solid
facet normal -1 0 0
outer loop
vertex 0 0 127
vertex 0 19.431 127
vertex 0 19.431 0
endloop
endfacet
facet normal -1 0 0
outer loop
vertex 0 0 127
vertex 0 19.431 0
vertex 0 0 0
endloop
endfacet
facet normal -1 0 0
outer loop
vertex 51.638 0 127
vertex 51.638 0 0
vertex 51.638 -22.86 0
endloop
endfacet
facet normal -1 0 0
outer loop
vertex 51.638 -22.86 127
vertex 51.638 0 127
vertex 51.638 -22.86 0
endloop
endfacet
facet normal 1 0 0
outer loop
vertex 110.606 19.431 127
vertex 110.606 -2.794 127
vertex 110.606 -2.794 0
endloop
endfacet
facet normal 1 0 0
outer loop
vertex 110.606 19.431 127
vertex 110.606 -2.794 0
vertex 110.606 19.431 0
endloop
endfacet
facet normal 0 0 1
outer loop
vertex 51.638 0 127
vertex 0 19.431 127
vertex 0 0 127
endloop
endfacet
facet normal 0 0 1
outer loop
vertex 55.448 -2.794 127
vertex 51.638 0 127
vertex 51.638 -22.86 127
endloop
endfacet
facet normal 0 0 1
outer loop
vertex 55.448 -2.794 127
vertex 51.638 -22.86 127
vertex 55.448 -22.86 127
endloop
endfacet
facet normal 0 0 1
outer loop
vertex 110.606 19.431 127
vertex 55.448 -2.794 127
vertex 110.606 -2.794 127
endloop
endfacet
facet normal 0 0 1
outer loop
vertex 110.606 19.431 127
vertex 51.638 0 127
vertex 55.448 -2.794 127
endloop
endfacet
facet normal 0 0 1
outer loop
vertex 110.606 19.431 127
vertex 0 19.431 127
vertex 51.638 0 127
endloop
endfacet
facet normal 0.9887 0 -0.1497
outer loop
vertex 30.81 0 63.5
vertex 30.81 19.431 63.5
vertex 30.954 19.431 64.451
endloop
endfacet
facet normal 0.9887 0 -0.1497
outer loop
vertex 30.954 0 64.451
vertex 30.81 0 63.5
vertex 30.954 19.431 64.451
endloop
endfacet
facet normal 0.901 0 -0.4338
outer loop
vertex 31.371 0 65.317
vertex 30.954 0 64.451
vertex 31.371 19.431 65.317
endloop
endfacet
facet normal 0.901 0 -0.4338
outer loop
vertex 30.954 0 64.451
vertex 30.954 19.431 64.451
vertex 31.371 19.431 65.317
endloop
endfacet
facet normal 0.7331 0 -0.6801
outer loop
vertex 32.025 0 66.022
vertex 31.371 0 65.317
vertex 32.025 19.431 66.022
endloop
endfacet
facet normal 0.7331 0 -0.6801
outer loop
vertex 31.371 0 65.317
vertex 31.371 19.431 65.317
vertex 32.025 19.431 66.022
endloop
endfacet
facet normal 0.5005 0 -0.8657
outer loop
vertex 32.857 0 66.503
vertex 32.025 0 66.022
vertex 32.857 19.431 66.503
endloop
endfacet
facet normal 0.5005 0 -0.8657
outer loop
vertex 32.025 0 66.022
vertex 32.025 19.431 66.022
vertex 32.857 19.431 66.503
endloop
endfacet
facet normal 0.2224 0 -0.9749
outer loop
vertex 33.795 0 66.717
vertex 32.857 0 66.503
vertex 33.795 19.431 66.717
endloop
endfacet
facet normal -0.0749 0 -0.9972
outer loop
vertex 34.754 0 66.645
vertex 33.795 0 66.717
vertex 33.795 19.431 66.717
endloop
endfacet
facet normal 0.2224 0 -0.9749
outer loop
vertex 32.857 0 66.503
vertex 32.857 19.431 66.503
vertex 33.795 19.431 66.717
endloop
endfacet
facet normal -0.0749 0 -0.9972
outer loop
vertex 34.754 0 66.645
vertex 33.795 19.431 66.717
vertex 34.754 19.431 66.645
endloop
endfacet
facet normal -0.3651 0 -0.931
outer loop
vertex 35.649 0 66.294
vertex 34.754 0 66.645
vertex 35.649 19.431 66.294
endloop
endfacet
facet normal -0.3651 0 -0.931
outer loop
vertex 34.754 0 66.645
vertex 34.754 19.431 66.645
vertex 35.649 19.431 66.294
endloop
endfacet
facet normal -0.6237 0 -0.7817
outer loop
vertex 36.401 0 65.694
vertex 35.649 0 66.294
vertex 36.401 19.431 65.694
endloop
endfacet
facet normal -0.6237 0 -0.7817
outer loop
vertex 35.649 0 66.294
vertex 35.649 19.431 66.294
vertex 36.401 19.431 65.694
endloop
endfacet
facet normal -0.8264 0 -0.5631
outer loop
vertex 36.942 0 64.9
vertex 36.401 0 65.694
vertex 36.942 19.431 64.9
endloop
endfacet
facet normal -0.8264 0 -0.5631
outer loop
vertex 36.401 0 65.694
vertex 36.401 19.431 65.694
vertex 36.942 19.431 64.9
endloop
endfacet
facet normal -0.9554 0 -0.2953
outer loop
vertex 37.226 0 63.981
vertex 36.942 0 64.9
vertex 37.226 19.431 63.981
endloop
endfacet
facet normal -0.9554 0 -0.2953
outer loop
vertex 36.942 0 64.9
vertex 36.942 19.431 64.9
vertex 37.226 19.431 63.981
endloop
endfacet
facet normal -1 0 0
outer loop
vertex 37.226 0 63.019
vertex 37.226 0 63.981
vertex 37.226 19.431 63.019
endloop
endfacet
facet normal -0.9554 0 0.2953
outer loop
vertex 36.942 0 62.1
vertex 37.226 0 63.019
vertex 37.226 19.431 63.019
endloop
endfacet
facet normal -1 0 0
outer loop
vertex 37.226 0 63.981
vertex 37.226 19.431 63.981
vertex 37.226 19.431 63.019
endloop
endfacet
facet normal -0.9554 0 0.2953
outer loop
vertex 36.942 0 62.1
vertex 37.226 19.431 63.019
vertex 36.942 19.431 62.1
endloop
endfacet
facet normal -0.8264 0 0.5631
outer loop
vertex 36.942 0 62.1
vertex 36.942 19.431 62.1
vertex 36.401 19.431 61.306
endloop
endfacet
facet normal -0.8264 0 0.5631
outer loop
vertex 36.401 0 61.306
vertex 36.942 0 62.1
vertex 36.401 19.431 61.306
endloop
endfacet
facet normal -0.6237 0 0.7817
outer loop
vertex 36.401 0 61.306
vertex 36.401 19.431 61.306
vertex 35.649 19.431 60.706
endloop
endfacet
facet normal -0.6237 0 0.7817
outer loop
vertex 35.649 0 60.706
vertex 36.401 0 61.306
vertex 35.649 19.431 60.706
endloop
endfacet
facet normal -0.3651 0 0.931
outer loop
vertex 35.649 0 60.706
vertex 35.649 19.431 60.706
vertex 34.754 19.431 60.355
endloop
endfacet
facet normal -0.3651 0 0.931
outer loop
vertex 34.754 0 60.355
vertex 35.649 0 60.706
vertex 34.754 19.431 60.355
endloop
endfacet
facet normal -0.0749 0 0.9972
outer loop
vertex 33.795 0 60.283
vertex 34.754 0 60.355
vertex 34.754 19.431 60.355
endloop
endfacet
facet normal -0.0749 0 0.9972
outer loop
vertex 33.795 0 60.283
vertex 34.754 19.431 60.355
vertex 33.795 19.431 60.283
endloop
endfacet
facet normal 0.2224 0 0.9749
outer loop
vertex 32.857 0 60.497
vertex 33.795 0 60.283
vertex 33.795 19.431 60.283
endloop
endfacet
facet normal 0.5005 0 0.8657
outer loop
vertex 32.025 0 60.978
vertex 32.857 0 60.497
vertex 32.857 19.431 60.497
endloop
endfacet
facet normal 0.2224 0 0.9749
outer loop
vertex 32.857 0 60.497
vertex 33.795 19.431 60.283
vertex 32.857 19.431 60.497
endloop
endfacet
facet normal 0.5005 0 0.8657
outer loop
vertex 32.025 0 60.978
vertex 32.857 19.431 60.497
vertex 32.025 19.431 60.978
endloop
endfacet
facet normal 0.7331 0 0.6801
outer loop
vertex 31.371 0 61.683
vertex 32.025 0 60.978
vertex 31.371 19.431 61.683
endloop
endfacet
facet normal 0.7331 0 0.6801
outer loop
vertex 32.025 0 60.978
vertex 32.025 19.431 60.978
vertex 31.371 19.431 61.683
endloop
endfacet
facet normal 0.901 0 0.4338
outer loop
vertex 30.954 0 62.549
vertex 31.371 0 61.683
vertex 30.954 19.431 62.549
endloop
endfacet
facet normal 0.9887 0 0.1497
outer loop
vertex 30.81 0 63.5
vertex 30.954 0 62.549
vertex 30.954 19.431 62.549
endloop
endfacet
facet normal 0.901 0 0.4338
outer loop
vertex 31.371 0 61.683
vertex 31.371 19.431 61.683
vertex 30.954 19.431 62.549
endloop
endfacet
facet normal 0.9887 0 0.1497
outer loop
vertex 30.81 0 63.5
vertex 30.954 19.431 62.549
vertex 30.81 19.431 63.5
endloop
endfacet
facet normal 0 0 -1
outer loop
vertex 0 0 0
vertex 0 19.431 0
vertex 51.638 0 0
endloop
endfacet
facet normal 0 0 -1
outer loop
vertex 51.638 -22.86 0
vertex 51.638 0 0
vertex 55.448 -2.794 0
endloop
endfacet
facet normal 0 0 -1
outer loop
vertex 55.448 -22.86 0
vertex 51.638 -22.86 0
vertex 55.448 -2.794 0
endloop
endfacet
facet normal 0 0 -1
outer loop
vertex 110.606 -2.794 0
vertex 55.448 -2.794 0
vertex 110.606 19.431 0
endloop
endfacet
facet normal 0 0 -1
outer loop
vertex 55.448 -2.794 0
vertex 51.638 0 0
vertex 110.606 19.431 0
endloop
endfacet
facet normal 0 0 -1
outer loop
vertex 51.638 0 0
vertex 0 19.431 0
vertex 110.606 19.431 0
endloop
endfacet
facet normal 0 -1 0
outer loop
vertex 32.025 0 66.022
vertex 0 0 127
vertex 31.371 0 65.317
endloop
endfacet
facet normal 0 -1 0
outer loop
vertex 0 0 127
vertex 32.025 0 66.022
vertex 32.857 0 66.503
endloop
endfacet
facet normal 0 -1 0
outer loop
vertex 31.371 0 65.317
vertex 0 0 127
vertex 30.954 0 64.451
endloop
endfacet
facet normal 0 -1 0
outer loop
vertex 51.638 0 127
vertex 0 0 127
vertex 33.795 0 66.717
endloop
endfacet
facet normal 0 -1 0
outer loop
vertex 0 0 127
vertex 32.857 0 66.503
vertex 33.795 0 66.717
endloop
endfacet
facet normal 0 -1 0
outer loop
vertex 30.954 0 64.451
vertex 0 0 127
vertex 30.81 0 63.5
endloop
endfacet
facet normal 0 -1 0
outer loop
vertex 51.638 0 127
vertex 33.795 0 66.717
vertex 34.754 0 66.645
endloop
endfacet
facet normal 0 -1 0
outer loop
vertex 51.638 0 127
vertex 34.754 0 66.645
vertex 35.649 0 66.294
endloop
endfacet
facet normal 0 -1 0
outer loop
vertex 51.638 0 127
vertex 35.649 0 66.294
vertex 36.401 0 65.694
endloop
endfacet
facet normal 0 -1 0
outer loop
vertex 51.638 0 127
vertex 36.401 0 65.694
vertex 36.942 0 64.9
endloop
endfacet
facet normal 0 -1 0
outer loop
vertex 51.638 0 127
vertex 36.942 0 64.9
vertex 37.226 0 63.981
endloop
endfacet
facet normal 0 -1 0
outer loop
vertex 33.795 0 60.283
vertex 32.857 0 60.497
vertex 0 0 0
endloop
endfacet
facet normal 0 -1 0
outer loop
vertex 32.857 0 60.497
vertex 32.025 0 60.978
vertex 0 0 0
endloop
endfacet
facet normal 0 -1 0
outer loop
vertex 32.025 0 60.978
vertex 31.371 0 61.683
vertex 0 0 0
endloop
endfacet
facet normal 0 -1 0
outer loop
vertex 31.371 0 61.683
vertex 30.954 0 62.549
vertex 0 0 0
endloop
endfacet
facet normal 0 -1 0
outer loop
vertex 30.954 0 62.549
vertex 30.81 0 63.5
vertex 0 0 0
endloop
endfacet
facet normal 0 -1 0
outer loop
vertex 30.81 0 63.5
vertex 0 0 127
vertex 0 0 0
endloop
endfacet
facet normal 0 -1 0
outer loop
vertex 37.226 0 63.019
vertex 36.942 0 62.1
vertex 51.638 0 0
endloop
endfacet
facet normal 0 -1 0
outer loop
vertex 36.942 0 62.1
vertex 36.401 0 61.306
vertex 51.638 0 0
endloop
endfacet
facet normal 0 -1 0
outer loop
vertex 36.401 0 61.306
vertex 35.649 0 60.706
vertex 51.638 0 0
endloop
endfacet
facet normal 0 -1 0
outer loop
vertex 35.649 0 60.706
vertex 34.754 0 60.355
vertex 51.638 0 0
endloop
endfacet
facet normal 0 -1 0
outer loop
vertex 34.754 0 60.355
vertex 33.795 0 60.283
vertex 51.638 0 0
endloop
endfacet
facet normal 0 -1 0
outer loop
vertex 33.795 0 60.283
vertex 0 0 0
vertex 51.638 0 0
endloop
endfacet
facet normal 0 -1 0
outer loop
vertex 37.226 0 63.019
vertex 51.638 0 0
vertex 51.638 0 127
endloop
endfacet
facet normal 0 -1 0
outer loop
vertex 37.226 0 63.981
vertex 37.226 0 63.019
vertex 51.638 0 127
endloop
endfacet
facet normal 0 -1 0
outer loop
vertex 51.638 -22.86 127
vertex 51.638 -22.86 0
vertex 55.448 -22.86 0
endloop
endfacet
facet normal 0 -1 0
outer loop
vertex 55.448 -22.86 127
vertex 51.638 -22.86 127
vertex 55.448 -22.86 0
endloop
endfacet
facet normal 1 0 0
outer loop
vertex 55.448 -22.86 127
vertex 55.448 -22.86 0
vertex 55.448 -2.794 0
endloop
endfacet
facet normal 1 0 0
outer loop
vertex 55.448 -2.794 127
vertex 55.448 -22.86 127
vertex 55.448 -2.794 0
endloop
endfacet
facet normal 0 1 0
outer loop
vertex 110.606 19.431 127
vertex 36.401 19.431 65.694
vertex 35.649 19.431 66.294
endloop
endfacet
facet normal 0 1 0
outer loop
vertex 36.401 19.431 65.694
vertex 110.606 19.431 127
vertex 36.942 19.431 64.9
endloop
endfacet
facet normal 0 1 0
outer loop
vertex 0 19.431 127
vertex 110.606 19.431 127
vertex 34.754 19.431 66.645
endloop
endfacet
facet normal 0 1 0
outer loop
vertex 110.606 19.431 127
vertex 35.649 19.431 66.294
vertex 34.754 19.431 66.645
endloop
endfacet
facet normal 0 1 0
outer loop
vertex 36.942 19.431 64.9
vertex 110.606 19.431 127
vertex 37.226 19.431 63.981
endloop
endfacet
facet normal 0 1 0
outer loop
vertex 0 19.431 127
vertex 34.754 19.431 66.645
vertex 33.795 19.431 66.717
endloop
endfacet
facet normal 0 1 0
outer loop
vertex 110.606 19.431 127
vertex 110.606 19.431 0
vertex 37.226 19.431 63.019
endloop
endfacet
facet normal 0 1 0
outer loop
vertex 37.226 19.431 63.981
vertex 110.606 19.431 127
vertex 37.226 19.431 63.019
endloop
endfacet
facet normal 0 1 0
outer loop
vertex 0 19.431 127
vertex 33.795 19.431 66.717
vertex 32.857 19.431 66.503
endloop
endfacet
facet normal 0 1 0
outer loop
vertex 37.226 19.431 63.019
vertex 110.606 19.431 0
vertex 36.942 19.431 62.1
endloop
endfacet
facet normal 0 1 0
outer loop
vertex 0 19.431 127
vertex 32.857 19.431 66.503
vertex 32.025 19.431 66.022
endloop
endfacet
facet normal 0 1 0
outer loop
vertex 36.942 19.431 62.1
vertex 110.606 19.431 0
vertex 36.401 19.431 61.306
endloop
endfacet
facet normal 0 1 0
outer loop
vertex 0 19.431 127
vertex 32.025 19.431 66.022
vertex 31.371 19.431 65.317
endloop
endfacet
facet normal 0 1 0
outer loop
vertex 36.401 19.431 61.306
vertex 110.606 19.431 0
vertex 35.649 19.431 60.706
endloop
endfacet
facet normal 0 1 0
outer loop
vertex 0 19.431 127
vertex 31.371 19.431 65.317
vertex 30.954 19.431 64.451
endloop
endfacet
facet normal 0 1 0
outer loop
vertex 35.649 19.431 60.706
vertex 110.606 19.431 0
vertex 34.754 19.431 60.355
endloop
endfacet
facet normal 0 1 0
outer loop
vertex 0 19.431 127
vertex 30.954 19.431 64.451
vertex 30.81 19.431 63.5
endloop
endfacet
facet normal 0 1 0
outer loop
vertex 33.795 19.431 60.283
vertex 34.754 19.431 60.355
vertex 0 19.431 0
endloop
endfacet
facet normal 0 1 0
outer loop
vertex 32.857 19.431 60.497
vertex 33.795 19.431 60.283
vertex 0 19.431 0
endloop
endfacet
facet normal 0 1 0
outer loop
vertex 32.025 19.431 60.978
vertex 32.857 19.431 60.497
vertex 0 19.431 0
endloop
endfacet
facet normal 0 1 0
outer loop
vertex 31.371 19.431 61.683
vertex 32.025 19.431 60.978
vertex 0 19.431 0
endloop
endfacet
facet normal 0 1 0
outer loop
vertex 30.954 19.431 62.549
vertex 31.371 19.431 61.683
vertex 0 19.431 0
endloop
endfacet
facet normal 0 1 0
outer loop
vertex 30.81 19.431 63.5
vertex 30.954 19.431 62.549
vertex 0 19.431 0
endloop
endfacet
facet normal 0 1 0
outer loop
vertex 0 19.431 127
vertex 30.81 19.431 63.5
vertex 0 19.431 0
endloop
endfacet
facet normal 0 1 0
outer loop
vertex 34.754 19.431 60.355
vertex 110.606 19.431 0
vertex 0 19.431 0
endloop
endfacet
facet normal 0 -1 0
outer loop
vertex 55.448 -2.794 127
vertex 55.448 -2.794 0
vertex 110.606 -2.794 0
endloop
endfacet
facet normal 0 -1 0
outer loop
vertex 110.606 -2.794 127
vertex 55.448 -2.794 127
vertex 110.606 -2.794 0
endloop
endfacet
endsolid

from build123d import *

# Parameters (mm, degrees)
F1_DEPTH = 127
F2_R     = 3.2258
F3_DEPTH = 19.431


with BuildPart() as f1:
    # F0 (on Top) → F1 (new body)
    with BuildSketch(Plane.XY):
        Polygon((0, 19.431), (0, 0), (51.6382, 0), (110.60591, 0), (110.60591, 19.431), align=None)
        Polygon((110.60591, 0), (51.6382, 0), (51.6382, -22.86), (55.4482, -22.86), (55.4482, -2.794), (110.60591, -2.794), align=None)
    extrude(amount=F1_DEPTH)

    # F2 (on face) → F3 (cut, through all)
    with BuildSketch(Plane(origin=(0, 19.431, 0), x_dir=(-1, 0, 0), z_dir=(0, 1, 0))):
        with Locations((-34.036, 63.5)):
            Circle(F2_R)
    extrude(amount=-F3_DEPTH, mode=Mode.SUBTRACT)


solid = f1.part
